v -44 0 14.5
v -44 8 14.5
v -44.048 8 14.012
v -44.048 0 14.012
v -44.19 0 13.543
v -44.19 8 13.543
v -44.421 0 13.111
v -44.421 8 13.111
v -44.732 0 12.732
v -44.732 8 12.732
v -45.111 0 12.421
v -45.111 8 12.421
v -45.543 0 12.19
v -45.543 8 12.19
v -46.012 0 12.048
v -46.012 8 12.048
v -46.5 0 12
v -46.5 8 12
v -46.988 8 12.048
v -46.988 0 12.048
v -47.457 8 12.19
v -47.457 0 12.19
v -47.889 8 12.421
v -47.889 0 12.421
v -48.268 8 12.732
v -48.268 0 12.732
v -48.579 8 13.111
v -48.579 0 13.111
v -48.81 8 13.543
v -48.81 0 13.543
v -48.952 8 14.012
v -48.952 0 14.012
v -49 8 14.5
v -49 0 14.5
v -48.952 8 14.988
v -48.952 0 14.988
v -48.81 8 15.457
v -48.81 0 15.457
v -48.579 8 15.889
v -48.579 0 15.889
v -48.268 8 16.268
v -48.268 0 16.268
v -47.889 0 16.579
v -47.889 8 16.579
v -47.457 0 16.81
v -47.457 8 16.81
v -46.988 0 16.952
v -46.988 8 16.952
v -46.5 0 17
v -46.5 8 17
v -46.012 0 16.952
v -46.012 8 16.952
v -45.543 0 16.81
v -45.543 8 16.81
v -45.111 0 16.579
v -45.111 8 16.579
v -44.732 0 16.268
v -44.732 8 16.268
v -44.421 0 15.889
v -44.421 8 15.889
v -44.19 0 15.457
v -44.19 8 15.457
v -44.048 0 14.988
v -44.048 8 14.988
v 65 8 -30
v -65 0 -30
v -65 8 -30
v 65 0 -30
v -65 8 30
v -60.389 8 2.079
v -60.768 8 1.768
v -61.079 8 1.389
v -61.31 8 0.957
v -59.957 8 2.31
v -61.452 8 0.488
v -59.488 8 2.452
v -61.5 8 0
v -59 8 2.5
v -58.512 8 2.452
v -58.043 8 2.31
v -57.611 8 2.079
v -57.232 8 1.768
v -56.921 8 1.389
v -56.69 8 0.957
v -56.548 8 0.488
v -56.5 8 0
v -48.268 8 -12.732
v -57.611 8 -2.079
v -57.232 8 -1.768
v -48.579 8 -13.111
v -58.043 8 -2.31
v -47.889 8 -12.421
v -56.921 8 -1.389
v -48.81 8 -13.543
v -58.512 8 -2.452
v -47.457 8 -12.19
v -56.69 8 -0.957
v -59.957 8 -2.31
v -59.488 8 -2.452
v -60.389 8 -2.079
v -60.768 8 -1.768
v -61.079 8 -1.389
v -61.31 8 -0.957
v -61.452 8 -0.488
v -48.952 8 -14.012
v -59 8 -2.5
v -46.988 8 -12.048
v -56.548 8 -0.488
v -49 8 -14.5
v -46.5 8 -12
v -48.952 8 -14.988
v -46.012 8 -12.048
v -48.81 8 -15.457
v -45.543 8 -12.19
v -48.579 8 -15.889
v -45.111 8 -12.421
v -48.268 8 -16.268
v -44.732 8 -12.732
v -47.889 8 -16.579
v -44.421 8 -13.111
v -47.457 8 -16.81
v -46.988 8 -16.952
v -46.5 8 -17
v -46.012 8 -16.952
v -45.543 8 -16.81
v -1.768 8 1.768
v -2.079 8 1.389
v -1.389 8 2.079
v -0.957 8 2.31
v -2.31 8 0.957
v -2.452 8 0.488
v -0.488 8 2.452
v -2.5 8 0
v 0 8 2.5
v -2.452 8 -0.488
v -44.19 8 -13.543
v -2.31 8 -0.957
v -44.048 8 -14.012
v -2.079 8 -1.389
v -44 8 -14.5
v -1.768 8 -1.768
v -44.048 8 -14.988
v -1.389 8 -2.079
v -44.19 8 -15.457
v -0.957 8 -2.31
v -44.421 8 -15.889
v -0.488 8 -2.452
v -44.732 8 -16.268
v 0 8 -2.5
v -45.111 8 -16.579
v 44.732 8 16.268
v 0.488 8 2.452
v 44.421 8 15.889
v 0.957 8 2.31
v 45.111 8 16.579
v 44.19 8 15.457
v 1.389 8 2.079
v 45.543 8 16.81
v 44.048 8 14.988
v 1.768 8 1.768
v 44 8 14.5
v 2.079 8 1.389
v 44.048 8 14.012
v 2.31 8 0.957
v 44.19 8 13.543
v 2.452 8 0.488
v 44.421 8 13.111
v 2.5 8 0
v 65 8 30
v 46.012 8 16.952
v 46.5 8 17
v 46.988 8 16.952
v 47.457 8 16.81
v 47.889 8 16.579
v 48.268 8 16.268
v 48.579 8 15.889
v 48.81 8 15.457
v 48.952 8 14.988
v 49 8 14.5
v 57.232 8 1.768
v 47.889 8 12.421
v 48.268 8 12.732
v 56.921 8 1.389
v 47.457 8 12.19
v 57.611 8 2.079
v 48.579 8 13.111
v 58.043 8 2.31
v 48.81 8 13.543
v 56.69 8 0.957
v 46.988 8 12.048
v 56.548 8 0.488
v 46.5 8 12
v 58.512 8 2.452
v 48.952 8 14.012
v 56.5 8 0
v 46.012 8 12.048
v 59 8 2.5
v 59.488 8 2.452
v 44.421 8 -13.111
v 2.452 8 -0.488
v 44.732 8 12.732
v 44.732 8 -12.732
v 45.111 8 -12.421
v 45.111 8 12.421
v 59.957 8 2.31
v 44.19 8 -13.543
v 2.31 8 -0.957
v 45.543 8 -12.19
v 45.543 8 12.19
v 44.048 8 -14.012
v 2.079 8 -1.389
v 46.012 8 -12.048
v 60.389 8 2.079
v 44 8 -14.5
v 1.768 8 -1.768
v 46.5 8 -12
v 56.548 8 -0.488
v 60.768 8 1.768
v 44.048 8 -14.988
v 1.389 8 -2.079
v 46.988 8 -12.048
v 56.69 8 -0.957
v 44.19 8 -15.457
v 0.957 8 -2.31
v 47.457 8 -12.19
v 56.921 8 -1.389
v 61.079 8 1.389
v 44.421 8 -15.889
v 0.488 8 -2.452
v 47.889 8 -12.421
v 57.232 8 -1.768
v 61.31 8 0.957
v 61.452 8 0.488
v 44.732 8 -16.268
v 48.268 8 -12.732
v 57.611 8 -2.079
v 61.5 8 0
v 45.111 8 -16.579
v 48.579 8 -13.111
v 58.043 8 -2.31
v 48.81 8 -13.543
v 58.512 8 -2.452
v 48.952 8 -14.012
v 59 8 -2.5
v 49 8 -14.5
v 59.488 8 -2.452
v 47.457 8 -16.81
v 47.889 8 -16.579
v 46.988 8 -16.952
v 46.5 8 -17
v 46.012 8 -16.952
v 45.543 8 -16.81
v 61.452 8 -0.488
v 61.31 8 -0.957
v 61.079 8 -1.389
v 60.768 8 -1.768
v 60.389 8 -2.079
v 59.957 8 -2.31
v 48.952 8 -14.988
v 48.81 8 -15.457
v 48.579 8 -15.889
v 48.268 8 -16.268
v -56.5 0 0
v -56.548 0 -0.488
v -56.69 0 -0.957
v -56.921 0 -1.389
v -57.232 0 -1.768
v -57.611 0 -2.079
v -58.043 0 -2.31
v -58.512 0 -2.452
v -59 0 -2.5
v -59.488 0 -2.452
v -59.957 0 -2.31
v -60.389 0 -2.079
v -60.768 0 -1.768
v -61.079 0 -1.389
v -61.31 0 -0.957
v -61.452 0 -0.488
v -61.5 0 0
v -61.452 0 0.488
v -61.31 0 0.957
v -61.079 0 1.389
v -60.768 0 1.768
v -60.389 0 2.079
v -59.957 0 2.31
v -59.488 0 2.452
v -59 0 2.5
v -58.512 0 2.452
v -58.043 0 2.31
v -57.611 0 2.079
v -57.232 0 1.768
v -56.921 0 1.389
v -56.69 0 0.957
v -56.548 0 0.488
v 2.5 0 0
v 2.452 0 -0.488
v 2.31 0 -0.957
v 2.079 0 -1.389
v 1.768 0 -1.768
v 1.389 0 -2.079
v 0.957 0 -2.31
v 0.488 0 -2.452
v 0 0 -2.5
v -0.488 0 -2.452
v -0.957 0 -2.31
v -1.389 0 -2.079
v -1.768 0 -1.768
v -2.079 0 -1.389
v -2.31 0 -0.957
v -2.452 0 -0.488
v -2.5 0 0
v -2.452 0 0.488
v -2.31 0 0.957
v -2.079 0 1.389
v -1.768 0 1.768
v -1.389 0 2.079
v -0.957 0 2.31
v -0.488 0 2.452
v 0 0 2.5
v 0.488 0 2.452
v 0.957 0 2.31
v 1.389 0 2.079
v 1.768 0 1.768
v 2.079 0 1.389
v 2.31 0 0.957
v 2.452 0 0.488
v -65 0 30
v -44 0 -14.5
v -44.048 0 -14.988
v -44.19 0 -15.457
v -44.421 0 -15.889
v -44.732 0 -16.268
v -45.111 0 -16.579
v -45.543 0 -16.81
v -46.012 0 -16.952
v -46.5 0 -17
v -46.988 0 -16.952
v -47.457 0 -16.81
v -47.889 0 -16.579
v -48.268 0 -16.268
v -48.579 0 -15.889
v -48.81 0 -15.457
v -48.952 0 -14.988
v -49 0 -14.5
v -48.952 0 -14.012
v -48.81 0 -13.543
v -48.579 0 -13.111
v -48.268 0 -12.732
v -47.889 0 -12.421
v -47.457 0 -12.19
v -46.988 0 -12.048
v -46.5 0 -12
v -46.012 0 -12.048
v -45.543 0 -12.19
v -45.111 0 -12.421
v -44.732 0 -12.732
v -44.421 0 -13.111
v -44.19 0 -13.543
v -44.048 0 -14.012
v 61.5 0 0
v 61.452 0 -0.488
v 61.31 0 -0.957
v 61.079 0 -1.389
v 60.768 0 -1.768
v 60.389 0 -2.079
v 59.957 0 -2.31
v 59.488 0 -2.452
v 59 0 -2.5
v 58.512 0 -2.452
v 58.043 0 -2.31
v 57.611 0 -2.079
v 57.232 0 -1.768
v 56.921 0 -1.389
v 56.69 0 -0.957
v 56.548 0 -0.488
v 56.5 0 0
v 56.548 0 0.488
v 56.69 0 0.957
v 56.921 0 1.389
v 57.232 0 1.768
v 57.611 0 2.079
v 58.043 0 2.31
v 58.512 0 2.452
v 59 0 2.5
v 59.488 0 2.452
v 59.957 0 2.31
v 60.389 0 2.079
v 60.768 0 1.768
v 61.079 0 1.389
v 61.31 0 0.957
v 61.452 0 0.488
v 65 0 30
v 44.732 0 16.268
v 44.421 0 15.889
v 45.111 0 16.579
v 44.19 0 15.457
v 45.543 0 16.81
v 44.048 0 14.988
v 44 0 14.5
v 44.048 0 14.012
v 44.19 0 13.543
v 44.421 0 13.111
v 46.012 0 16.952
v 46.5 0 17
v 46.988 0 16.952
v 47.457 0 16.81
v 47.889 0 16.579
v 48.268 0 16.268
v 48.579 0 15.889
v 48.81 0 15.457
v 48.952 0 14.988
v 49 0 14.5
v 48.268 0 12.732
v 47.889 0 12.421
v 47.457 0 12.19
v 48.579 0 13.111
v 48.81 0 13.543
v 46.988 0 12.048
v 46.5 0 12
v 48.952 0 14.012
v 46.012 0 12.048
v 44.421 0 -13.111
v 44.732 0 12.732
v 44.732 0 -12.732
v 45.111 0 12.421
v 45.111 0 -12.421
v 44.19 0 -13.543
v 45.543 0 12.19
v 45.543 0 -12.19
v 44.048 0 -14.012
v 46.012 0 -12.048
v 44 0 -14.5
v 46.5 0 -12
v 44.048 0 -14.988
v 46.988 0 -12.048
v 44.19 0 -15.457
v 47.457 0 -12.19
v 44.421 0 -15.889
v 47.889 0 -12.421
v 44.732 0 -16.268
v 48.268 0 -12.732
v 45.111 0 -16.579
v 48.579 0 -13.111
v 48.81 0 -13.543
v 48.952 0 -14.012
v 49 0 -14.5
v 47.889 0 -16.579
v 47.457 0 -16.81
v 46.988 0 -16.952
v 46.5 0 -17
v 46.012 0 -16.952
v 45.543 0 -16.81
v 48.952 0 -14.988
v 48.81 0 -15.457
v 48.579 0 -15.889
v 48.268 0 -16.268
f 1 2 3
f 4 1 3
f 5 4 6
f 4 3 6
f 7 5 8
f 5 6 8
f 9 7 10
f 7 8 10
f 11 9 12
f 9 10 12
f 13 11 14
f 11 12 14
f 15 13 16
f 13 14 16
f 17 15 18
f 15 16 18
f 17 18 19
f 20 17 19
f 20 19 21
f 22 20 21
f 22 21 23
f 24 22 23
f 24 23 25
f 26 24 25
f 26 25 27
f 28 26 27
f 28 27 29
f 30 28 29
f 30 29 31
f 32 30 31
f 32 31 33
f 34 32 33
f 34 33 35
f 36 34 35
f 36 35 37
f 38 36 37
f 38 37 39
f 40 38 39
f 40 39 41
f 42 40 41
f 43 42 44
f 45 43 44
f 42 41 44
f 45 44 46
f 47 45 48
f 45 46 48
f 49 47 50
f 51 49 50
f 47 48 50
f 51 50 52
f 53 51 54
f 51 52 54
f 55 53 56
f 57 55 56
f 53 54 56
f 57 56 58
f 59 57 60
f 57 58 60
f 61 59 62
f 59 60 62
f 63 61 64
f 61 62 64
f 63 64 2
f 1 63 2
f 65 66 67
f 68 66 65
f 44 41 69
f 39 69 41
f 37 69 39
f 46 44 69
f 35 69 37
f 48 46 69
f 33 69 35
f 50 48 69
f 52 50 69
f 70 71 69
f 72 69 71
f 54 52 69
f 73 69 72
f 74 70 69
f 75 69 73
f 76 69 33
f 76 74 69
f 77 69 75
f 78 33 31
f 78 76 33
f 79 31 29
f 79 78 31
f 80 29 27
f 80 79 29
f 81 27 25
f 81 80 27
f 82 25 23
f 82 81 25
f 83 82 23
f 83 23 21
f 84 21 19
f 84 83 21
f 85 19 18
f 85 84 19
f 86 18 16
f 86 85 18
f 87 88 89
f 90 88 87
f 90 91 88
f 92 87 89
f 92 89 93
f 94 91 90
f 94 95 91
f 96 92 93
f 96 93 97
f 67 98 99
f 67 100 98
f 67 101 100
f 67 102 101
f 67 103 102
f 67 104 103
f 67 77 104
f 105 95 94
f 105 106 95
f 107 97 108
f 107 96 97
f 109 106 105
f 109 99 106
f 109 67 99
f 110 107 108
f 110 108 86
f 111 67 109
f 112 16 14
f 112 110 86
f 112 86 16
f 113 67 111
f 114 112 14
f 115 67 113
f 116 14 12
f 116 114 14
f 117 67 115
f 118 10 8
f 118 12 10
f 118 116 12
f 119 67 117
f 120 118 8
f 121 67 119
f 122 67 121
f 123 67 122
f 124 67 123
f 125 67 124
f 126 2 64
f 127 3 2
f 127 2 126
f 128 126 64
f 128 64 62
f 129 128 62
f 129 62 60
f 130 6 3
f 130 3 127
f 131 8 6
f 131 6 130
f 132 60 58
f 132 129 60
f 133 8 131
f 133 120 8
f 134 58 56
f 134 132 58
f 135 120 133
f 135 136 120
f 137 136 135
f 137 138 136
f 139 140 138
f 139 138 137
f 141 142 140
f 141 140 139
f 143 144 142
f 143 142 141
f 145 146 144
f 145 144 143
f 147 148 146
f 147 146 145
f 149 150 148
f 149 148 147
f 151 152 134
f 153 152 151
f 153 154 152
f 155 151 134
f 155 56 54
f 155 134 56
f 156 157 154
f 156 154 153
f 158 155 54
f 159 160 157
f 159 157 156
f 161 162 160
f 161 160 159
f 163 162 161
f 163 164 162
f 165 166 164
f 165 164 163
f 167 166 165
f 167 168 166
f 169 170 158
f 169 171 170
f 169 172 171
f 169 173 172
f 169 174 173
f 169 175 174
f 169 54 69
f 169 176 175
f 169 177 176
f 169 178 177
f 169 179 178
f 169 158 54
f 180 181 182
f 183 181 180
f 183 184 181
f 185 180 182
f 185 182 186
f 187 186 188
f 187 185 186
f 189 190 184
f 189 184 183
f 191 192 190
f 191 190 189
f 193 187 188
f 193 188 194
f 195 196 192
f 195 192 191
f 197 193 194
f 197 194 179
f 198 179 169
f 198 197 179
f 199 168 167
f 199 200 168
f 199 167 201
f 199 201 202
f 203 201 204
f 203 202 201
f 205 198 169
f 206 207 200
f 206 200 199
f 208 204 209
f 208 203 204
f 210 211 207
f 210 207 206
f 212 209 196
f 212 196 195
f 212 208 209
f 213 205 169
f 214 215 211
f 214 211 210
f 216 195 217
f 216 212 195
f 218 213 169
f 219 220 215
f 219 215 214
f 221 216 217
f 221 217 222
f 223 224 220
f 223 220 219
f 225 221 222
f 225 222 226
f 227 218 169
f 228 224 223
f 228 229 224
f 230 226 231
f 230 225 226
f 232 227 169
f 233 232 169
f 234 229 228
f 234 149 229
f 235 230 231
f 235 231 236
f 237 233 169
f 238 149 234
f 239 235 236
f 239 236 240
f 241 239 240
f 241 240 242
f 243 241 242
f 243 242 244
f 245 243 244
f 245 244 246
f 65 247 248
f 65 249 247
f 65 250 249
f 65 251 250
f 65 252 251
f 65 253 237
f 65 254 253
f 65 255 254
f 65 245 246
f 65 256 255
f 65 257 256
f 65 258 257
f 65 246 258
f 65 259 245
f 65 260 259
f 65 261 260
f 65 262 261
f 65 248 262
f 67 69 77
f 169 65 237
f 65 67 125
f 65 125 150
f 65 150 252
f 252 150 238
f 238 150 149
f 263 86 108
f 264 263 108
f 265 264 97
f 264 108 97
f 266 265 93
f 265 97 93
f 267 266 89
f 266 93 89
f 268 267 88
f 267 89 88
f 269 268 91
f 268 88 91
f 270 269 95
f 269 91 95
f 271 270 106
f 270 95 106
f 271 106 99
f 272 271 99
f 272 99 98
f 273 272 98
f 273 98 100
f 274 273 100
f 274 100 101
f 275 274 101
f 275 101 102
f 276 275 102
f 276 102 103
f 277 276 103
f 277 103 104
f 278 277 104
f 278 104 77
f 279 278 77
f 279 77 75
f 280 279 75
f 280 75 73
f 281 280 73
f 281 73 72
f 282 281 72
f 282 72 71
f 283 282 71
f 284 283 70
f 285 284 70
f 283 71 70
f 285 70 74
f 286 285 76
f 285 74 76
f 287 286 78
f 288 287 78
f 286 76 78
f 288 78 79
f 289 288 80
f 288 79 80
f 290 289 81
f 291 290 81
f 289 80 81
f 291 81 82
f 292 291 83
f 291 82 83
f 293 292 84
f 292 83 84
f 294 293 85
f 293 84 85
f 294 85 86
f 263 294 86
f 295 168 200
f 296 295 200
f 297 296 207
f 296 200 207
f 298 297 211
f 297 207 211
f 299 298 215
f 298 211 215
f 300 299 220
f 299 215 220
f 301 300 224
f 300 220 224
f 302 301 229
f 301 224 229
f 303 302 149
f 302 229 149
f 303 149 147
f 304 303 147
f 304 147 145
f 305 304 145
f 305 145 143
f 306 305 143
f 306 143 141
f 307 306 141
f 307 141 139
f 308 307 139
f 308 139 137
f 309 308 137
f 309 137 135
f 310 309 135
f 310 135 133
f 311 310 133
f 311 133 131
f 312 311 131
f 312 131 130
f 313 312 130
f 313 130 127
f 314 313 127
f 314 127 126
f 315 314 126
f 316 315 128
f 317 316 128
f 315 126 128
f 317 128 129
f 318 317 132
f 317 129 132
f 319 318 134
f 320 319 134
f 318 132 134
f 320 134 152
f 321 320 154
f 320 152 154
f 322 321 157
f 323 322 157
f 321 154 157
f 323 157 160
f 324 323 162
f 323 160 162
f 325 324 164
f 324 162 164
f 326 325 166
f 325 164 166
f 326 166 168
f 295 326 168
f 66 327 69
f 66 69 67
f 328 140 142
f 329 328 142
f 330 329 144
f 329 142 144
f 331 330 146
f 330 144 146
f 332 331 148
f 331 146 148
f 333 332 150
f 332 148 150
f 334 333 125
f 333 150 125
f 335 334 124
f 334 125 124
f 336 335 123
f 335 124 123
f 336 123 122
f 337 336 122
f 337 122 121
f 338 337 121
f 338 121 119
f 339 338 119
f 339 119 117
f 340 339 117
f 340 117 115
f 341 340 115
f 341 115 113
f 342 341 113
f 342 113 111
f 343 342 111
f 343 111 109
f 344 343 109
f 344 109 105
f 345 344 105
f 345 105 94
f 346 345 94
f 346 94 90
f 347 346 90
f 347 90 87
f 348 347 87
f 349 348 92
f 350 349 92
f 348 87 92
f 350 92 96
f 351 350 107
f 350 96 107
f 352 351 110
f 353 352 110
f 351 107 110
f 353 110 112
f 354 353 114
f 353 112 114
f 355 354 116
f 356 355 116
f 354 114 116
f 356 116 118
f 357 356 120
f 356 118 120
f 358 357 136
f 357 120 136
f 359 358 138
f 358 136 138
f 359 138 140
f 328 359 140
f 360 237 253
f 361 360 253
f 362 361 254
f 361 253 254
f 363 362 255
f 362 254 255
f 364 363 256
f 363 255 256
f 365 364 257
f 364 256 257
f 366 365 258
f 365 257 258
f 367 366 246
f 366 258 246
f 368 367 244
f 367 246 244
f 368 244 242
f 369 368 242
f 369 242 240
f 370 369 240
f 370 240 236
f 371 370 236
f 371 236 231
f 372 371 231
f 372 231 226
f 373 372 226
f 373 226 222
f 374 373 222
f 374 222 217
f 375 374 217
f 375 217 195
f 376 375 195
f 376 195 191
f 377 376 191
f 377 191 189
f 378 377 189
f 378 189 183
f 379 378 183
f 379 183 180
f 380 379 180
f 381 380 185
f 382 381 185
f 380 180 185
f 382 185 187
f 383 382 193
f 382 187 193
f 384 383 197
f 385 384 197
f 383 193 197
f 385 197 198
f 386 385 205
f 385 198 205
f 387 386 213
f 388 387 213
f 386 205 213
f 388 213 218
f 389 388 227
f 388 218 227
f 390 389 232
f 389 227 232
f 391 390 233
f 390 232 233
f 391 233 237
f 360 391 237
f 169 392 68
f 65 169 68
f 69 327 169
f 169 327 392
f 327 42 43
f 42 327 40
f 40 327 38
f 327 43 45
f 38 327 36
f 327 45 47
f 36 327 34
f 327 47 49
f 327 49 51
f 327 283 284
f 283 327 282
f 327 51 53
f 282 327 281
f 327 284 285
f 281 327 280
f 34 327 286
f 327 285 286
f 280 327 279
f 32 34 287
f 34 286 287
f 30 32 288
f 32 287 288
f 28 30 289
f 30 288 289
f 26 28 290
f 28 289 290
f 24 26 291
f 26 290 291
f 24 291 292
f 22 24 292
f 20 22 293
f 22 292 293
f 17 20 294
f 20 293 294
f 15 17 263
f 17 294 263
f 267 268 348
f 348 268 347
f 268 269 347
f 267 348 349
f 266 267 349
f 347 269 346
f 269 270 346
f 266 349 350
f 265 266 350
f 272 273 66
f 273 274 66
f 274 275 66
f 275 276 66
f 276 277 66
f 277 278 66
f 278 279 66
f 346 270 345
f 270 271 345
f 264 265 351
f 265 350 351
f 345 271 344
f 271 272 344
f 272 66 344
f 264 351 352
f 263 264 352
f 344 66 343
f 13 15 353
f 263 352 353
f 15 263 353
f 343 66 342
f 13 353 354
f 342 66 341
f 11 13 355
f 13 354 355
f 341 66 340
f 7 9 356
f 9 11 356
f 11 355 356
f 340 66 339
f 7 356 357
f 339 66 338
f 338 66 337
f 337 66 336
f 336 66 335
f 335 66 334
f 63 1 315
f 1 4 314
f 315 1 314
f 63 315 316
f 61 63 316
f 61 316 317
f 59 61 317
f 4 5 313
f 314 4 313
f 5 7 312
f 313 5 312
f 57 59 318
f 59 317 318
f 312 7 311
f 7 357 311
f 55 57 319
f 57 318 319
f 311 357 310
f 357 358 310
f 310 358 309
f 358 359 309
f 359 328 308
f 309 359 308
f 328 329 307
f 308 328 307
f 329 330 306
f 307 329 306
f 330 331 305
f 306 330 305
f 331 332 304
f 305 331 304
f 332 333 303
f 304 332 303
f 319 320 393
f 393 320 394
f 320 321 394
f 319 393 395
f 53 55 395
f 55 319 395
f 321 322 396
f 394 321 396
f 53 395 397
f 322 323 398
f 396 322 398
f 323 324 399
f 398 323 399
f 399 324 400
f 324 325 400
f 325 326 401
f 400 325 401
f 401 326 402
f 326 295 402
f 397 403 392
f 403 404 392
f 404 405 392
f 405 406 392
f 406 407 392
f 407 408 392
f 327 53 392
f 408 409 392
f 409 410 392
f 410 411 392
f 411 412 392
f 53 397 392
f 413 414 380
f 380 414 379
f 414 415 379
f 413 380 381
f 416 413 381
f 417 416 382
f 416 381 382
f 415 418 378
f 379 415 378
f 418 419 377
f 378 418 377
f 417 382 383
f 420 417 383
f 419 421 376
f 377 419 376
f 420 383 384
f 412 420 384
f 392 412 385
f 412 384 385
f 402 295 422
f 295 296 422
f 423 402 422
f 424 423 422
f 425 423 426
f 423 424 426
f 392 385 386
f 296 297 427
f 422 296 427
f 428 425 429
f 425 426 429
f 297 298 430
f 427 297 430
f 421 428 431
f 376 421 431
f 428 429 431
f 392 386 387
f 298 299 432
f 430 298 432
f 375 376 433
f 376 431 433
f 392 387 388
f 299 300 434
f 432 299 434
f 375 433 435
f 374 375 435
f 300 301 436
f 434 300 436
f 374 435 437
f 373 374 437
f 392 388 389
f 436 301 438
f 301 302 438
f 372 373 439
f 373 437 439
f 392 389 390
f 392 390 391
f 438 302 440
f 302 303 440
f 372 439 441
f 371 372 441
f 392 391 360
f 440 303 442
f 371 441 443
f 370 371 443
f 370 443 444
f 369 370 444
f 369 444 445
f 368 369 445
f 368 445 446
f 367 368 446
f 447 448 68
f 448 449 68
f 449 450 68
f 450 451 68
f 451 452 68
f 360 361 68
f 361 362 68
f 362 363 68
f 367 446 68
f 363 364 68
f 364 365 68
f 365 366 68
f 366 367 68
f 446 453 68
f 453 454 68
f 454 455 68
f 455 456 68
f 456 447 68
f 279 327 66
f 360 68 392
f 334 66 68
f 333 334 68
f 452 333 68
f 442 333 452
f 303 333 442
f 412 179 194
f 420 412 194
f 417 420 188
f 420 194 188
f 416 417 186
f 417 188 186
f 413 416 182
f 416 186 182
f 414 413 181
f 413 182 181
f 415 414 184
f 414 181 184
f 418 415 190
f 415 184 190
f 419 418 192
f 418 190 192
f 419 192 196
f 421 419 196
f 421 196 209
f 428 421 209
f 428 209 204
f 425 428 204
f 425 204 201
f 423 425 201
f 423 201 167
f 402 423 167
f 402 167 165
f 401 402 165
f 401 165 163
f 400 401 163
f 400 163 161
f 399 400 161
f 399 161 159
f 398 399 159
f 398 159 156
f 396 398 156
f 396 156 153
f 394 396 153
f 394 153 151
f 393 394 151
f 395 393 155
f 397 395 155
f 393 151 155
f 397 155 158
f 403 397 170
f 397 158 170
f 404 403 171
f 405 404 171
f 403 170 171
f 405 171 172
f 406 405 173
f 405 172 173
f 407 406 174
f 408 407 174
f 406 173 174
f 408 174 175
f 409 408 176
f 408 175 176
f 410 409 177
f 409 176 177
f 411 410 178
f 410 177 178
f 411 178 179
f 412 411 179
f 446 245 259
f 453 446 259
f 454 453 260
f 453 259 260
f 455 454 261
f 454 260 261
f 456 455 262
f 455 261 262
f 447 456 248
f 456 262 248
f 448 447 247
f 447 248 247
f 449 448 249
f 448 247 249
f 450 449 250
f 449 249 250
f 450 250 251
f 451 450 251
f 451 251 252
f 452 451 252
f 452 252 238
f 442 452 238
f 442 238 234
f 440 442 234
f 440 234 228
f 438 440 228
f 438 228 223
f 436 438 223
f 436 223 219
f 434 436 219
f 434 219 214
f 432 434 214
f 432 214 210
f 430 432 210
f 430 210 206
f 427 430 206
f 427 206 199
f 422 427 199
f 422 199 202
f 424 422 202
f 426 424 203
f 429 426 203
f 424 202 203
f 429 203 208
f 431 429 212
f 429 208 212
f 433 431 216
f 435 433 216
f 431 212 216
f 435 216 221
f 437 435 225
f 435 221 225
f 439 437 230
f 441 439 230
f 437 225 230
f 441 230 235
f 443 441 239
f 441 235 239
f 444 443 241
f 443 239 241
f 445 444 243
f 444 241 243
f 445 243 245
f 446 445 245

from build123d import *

# Parameters (mm, degrees)
SKETCH_1_W          = 130
SKETCH_1_H          = 60
EXTRUDE_1_DEPTH     = 8
SKETCH_2_R          = 2.5
CUT_EXTRUDE_1_DEPTH = 9


with BuildPart() as part:
    # ｽｹｯﾁ1 → ﾎﾞｽ - 押し出し1 (new body)
    with BuildSketch(Plane(origin=(0, 0, 0), x_dir=(1, 0, 0), z_dir=(0, 1, 0))):
        Rectangle(SKETCH_1_W, SKETCH_1_H)
    extrude(amount=EXTRUDE_1_DEPTH)

    # ｽｹｯﾁ2 → ｶｯﾄ - 押し出し1 (cut, through all)
    with BuildSketch(Plane(origin=(0, 8, 0), x_dir=(1, 0, 0), z_dir=(0, 1, 0))):
        Circle(SKETCH_2_R)
        with Locations((59, 0)):
            Circle(SKETCH_2_R)
        with Locations((46.5, -14.5)):
            Circle(SKETCH_2_R)
        with Locations((46.5, 14.5)):
            Circle(SKETCH_2_R)
        with Locations((-46.5, -14.5)):
            Circle(SKETCH_2_R)
        with Locations((-59, 0)):
            Circle(SKETCH_2_R)
        with Locations((-46.5, 14.5)):
            Circle(SKETCH_2_R)
    extrude(amount=-CUT_EXTRUDE_1_DEPTH, mode=Mode.SUBTRACT)


solid = part.part
